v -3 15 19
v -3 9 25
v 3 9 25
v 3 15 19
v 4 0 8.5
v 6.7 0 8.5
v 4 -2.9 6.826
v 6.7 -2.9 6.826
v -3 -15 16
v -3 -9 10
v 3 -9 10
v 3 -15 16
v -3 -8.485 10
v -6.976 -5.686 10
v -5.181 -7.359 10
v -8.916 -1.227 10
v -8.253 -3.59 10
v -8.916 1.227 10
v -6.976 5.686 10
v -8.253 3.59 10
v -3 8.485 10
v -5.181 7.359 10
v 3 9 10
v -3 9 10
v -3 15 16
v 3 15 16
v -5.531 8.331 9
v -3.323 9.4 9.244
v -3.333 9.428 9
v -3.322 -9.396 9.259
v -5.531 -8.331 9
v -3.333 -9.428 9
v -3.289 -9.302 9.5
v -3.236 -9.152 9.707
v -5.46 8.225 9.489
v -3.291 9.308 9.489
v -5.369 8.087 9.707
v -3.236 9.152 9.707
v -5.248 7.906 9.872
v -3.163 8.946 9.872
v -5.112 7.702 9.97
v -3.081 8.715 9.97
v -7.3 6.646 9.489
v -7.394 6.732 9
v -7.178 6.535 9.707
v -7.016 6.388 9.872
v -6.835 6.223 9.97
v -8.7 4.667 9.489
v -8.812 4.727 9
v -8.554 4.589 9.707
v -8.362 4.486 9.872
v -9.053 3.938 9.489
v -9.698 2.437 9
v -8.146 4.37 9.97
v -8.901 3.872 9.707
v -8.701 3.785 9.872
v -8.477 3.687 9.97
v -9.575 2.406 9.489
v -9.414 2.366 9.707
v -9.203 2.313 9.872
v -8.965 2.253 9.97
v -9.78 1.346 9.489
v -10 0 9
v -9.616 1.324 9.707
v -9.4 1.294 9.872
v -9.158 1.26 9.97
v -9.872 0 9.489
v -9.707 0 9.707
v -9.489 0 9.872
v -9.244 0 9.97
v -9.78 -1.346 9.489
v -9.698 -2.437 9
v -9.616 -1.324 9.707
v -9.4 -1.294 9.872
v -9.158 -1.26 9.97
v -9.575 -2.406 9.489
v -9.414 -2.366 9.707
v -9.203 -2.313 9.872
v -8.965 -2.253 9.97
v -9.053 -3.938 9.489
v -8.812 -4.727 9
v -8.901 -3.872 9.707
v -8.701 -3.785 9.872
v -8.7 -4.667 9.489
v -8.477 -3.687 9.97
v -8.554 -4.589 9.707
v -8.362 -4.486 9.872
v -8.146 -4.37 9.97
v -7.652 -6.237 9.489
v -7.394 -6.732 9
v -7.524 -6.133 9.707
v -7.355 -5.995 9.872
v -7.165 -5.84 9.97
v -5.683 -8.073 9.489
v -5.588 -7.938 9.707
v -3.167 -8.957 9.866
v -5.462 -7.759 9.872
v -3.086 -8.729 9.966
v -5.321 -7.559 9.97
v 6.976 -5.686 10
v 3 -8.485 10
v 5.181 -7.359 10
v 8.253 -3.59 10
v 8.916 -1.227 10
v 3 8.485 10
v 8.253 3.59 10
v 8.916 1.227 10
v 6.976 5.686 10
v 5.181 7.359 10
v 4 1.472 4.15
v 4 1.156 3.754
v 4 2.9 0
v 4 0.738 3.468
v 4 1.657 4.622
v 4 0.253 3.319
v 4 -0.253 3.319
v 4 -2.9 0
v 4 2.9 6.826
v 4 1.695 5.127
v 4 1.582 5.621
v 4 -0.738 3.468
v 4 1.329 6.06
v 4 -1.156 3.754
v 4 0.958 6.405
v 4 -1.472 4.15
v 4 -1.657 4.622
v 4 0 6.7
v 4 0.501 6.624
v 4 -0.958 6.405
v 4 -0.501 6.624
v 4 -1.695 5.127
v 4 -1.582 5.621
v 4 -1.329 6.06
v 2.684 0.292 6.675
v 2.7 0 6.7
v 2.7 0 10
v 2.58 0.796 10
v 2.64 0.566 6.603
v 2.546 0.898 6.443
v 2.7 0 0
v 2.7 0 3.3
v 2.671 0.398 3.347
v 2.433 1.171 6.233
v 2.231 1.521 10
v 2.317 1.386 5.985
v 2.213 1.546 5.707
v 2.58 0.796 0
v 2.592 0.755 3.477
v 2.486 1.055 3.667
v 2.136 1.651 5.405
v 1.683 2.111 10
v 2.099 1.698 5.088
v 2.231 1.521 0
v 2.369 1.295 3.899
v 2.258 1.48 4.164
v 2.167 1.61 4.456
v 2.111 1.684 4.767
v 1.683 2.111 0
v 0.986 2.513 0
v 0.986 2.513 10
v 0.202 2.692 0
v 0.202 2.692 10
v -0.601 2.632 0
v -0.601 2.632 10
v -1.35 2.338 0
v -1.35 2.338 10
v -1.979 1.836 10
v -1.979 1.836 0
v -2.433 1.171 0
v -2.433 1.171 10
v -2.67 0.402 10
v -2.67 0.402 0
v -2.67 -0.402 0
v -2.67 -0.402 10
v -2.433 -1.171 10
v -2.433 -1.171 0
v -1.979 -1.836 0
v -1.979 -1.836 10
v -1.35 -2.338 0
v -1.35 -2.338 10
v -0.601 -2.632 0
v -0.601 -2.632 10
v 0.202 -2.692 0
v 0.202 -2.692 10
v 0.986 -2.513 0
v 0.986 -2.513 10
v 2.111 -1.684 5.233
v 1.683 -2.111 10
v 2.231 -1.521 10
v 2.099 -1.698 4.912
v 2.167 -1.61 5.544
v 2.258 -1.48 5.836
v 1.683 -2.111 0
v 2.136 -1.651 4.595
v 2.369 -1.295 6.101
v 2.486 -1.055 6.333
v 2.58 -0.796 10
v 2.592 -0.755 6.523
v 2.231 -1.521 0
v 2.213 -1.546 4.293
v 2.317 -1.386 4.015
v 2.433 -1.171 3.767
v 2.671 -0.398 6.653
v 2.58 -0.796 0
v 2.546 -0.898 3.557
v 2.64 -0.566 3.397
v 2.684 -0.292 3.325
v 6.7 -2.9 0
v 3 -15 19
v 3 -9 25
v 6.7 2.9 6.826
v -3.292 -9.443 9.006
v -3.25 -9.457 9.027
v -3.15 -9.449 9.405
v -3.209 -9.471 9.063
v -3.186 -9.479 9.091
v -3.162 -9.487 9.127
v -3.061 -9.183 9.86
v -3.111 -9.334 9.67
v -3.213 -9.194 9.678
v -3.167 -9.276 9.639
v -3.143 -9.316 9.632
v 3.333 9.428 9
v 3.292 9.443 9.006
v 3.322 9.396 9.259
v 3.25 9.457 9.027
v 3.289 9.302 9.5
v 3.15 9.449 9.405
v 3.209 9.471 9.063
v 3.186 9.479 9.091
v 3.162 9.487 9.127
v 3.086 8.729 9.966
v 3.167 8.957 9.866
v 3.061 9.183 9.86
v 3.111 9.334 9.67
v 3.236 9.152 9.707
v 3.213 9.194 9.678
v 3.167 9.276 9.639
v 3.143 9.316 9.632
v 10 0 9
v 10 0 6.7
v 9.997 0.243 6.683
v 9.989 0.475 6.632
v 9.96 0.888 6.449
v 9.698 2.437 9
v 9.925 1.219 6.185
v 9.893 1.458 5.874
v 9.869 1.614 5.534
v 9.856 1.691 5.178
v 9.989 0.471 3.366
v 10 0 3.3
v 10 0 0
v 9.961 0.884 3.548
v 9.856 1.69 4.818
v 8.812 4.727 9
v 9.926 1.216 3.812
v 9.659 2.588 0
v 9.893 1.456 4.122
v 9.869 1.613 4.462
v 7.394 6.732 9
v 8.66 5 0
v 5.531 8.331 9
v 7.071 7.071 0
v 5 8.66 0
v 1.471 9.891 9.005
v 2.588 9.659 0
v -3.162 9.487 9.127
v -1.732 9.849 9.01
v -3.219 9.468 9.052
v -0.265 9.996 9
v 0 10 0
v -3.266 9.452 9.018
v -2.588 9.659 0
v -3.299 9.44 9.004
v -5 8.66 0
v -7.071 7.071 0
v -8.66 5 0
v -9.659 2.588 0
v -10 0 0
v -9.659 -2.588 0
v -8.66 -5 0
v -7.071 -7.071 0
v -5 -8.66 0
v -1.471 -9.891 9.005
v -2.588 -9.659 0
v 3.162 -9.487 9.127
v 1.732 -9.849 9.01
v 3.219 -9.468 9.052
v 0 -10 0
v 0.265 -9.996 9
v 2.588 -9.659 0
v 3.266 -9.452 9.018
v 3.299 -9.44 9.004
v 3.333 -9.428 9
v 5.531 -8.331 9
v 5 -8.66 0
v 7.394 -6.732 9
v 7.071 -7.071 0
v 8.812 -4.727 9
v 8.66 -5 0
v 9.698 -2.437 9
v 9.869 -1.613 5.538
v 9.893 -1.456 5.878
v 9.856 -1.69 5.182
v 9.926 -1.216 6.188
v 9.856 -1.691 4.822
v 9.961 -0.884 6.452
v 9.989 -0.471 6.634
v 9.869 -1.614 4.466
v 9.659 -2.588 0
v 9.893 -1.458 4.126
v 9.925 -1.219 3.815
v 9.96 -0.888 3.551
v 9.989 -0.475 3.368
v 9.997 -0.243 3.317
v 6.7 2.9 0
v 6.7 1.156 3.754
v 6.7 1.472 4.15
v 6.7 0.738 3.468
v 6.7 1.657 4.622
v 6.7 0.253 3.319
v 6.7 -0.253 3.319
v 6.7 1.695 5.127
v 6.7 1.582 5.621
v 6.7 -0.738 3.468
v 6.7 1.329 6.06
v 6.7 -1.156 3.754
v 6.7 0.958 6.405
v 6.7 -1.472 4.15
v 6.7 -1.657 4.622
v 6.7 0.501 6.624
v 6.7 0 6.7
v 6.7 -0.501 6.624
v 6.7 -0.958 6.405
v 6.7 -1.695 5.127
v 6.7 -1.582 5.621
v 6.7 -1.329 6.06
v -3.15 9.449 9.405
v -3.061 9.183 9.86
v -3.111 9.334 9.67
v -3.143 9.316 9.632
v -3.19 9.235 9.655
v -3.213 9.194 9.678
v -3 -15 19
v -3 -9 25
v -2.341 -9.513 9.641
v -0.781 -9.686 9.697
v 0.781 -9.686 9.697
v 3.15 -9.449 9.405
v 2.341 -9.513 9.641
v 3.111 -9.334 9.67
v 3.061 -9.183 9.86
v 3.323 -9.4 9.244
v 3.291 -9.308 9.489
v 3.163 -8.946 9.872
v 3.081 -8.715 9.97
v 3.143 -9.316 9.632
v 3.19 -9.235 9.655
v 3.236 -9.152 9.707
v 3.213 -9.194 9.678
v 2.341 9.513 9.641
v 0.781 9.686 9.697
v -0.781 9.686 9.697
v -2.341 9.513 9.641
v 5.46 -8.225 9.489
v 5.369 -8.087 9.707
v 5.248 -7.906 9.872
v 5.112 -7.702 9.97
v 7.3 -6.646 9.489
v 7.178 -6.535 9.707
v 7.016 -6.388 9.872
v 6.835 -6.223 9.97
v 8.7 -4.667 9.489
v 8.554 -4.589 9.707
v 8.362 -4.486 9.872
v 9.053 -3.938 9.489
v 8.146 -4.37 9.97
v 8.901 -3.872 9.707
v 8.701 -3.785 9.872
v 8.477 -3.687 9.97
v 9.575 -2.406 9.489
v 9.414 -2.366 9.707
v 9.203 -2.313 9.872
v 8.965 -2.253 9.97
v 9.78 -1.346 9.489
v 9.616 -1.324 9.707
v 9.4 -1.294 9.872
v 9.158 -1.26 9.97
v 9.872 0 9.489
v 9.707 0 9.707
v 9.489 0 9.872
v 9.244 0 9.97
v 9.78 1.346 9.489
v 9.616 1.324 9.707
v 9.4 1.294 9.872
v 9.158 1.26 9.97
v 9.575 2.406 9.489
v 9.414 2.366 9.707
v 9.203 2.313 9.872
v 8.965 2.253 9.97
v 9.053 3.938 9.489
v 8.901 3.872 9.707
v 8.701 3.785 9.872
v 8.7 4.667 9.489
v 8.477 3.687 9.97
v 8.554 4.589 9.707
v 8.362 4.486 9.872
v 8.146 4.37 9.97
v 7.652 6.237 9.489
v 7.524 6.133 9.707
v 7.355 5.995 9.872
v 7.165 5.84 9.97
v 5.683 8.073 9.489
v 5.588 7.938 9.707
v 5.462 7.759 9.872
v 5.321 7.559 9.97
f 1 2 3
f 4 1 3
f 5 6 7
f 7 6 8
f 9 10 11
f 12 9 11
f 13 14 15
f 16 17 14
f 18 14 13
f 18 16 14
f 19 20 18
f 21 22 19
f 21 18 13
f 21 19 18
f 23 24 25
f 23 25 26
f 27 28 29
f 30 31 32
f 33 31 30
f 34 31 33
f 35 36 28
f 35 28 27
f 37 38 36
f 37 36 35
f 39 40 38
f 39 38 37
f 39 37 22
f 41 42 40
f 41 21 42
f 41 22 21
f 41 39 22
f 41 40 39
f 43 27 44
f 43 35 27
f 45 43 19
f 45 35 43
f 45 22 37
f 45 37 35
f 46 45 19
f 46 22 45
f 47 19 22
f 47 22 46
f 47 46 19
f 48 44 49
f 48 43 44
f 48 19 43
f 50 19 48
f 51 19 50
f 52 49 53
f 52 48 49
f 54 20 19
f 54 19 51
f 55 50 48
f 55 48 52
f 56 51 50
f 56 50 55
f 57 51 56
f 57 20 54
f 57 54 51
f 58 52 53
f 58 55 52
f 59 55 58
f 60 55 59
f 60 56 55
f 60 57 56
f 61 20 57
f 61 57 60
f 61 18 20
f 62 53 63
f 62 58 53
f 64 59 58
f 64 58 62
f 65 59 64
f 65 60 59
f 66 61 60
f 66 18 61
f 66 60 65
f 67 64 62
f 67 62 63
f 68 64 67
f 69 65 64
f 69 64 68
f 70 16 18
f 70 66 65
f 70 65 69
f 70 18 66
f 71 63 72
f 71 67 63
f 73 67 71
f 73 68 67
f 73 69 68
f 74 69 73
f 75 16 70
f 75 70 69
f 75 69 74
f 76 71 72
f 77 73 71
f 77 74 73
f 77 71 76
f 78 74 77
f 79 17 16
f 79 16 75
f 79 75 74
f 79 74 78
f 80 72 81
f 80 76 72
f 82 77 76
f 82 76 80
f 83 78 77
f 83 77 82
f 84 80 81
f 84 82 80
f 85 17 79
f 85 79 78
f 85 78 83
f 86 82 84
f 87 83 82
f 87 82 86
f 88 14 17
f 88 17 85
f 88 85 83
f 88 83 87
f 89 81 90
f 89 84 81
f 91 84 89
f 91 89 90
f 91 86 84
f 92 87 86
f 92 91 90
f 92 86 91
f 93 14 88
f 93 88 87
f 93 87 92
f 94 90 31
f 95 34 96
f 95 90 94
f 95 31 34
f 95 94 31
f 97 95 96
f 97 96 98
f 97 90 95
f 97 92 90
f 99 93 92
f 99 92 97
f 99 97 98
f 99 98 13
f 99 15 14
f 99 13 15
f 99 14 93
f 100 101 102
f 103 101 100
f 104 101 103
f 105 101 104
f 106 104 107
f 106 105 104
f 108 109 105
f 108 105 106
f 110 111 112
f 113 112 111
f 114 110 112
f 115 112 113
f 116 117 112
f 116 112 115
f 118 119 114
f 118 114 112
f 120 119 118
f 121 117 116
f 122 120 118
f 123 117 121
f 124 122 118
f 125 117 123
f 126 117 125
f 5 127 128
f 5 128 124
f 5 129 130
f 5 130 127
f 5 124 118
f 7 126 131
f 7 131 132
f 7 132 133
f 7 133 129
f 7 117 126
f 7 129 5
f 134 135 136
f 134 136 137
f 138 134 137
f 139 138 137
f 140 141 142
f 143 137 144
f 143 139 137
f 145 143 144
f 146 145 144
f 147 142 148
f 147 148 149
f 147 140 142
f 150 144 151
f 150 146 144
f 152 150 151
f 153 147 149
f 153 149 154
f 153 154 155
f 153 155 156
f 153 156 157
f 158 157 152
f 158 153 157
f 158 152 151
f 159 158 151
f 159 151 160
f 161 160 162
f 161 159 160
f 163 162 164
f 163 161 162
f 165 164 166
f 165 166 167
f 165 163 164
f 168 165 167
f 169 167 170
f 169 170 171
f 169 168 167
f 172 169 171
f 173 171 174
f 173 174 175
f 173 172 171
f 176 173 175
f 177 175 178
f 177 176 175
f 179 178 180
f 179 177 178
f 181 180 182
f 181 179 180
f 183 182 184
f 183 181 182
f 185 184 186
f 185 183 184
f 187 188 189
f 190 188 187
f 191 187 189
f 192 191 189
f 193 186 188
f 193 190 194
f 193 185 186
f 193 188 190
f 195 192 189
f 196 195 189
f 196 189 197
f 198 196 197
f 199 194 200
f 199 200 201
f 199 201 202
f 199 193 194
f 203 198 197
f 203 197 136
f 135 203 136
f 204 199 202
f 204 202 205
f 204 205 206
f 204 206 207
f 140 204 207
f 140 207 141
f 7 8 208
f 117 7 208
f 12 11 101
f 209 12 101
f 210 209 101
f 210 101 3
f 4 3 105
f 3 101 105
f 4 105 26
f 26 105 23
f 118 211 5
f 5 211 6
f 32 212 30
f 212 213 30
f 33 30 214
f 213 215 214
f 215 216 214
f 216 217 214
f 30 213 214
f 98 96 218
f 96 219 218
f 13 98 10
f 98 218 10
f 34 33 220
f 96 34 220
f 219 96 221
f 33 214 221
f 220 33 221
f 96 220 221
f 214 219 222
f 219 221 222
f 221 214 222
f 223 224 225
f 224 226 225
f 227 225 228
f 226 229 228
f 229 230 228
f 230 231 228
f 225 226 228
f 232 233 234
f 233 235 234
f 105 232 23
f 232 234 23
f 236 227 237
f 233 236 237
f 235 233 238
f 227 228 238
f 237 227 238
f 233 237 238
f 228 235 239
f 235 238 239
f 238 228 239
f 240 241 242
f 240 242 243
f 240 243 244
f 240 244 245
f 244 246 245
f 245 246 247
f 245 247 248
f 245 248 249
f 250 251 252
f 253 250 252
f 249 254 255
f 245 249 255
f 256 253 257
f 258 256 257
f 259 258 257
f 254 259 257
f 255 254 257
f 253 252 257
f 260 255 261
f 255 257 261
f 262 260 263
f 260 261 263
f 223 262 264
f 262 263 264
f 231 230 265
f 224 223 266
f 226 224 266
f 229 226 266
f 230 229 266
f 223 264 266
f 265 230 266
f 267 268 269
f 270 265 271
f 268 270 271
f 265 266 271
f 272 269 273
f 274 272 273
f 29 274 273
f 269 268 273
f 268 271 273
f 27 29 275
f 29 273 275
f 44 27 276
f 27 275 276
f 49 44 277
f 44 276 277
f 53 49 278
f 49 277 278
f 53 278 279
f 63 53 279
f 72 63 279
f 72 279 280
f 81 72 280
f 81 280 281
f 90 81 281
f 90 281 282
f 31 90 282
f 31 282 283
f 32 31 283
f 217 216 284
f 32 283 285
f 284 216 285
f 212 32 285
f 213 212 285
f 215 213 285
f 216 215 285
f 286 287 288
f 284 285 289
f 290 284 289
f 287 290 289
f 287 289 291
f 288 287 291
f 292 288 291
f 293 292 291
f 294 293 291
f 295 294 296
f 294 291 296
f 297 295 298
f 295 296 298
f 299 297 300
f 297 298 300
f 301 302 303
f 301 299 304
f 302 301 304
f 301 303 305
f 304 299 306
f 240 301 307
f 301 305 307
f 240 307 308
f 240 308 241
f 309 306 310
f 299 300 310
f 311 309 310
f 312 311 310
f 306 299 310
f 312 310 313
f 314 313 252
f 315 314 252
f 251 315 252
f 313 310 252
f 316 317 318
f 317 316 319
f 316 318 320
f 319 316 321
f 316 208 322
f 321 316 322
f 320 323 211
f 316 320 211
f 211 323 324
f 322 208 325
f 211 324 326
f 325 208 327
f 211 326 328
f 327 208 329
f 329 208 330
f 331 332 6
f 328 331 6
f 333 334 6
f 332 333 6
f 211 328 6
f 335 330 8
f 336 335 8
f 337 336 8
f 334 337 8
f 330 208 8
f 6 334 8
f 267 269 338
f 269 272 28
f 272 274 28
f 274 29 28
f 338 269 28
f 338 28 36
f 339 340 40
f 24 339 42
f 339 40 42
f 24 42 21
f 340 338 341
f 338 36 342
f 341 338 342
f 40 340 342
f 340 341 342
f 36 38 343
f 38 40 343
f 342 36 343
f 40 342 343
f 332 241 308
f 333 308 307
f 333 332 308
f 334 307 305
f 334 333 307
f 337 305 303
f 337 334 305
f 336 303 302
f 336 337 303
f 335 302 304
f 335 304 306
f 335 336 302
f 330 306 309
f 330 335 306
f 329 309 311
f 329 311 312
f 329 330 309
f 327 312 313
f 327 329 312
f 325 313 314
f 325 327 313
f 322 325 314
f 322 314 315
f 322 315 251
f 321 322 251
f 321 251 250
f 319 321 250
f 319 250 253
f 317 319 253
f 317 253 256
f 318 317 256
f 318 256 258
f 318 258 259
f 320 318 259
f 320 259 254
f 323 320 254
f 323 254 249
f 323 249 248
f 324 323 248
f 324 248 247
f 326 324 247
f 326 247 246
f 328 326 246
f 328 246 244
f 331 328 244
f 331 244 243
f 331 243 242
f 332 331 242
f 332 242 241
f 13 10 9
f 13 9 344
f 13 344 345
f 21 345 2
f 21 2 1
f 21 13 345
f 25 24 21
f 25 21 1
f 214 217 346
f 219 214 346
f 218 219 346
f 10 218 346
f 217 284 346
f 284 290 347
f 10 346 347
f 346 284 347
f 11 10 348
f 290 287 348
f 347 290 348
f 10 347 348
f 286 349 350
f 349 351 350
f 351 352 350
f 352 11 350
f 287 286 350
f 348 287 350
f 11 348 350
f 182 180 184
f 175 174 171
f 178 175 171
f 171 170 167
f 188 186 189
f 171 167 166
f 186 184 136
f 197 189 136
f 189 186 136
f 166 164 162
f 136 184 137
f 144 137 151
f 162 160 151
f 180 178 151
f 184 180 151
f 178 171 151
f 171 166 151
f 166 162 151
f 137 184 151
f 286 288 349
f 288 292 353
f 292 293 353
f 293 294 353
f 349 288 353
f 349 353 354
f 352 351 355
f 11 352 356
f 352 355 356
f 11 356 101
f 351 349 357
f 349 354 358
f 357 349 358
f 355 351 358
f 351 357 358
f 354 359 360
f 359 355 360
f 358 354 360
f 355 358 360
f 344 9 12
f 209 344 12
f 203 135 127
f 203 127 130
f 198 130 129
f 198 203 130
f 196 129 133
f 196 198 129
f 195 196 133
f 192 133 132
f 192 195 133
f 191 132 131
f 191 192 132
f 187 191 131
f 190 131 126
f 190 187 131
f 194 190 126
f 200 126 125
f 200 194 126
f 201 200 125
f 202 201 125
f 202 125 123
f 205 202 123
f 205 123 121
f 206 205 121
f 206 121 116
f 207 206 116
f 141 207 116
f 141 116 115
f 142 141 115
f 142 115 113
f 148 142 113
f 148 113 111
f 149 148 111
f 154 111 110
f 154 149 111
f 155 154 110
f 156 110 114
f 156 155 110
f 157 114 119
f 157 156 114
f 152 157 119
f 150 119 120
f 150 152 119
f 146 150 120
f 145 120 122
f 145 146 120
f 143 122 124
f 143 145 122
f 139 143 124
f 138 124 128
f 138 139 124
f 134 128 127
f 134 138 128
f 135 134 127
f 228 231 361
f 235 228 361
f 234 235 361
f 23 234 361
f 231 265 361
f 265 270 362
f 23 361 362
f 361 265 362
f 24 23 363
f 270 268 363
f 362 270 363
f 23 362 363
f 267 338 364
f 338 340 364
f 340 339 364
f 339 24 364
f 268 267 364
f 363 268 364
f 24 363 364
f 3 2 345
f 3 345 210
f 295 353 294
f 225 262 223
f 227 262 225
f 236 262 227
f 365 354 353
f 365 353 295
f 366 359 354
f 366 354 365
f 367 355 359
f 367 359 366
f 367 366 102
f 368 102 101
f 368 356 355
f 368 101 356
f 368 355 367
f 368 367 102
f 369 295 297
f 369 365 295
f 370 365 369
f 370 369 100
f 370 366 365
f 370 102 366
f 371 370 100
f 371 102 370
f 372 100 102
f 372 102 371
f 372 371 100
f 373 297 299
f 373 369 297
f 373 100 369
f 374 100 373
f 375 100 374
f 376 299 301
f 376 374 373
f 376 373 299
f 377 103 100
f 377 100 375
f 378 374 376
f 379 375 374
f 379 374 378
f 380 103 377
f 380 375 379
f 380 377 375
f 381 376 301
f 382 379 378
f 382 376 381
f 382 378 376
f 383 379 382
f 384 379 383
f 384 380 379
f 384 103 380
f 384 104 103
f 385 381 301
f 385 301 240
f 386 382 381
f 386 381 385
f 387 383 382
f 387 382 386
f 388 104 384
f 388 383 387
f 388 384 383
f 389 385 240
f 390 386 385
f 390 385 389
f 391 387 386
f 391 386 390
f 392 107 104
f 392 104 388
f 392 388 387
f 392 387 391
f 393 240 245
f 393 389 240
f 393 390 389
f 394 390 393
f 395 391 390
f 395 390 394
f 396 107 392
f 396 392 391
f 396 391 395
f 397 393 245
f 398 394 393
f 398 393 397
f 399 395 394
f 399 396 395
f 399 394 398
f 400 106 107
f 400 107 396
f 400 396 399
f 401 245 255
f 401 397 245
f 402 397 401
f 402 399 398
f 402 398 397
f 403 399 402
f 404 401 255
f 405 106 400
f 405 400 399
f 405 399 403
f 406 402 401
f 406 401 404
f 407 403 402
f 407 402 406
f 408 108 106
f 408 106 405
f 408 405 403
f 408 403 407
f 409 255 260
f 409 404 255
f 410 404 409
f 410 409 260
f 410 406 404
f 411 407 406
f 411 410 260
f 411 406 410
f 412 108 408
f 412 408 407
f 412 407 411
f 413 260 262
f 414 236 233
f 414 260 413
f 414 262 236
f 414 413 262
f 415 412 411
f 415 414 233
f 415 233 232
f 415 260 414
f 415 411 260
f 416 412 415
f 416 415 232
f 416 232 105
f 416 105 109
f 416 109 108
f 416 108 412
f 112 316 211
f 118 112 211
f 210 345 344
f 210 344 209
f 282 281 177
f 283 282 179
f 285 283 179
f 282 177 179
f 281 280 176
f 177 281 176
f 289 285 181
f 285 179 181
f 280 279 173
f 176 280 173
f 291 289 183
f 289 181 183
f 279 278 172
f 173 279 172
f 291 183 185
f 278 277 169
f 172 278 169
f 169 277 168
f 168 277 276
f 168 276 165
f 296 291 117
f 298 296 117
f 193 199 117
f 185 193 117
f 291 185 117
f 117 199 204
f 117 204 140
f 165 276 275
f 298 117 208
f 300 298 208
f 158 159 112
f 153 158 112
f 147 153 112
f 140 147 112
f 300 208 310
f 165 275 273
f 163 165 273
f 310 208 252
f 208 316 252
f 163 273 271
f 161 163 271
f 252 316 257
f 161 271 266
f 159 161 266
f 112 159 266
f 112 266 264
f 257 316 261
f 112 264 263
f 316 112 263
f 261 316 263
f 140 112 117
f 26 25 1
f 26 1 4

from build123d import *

# Parameters (mm, degrees)
PAD007_DEPTH             = 2.7
CLONE087_ROLL_ANGLE      = 180
CYLINDER1014_R           = 2.7
CYLINDER1014_DEPTH       = 100
CYLINDER1018_R           = 1.7
CYLINDER1018_DEPTH       = 10
CLONE086_PITCH_ANGLE     = -90
CLONE086_PLACEMENT_ANGLE = -180
BOX044_W                 = 6
BOX044_H                 = 30
BOX044_DEPTH             = 15
CHAMFER017_SIZE          = 6
CYLINDER1039_R           = 10
CYLINDER1039_DEPTH       = 10
FILLET_R                 = 1


with BuildPart() as clone_of_m3nuthousingmaster012:
    # Sketch008 → Pad007 (new body)
    with BuildSketch(Plane(origin=(65, 30, 1.5), x_dir=(0, 0, 1), z_dir=(-1, 0, 0))):
        Polygon((0, 0), (1.674316, 2.9), (21.674316, 2.9), (21.674316, -2.9), (1.674316, -2.9), align=None)
    extrude(amount=PAD007_DEPTH)


with BuildPart() as clone_of_m3nuthousingmaster012_1:
    # Clone087 roll: moved
    add(clone_of_m3nuthousingmaster012.part.rotate(Axis((0, 0, 0), (1, 0, 0)), CLONE087_ROLL_ANGLE))


with BuildPart() as clone_of_m3nuthousingmaster012_2:
    # Clone087 placement: moved
    add(clone_of_m3nuthousingmaster012_1.part.moved(Location((-58.3, 30, 10))))


with BuildPart() as clone_of_5mmrodmaster013:
    # Cylinder1014 → Cylinder1014 (new body)
    with BuildSketch(Plane.XY):
        Circle(CYLINDER1014_R)
    extrude(amount=CYLINDER1014_DEPTH)


with BuildPart() as clone_of_5mmrodmaster013_1:
    # Clone085 placement: moved
    add(clone_of_5mmrodmaster013.part.moved(Location((0, 0, -90))))


with BuildPart() as fusion069:
    # Cylinder1018 → Cylinder1018 (new body)
    with BuildSketch(Plane.XY):
        Circle(CYLINDER1018_R)
    extrude(amount=CYLINDER1018_DEPTH)


with BuildPart() as fusion069_1:
    # Clone086 pitch: moved
    add(fusion069.part.rotate(Axis((0, 0, 0), (0, 1, 0)), CLONE086_PITCH_ANGLE))


with BuildPart() as fusion069_2:
    # Clone086 placement: moved
    add(fusion069_1.part.moved(Location((1, 0, 5))).rotate(Axis((1, 0, 5), (0, 0, 1)), CLONE086_PLACEMENT_ANGLE))

    # Fusion069: union Clone of M3NutHousingMaster012, Clone of 5mmRodMaster013
    add(clone_of_m3nuthousingmaster012_2.part)
    add(clone_of_5mmrodmaster013_1.part)


with BuildPart() as chamfer017:
    # Box044 → Box044 (new body)
    with BuildSketch(Plane(origin=(-3, -15, 10), x_dir=(1, 0, 0), z_dir=(0, 0, 1))):
        with Locations((3, 15)):
            Rectangle(BOX044_W, BOX044_H)
    extrude(amount=BOX044_DEPTH)

    # Chamfer017
    chamfer017_edges = [chamfer017.edges().sort_by_distance(p)[0] for p in [
        (0, -15, 10),
        (0, -15, 25),
        (0, 15, 10),
        (0, 15, 25),
    ]]
    chamfer(chamfer017_edges, length=CHAMFER017_SIZE)


with BuildPart() as adjustwheel:
    # Cylinder1039 → Cylinder1039 (new body)
    with BuildSketch(Plane.XY):
        Circle(CYLINDER1039_R)
    extrude(amount=CYLINDER1039_DEPTH)

    # Fusion070: union Chamfer017
    add(chamfer017.part)

    # Fillet
    fillet_edges = [adjustwheel.edges().sort_by_distance(p)[0] for p in [
        (-10, 0, 10),
    ]]
    fillet(fillet_edges, radius=FILLET_R)

    # Cut052: cut Fusion069
    add(fusion069_2.part, mode=Mode.SUBTRACT)


solid = adjustwheel.part
